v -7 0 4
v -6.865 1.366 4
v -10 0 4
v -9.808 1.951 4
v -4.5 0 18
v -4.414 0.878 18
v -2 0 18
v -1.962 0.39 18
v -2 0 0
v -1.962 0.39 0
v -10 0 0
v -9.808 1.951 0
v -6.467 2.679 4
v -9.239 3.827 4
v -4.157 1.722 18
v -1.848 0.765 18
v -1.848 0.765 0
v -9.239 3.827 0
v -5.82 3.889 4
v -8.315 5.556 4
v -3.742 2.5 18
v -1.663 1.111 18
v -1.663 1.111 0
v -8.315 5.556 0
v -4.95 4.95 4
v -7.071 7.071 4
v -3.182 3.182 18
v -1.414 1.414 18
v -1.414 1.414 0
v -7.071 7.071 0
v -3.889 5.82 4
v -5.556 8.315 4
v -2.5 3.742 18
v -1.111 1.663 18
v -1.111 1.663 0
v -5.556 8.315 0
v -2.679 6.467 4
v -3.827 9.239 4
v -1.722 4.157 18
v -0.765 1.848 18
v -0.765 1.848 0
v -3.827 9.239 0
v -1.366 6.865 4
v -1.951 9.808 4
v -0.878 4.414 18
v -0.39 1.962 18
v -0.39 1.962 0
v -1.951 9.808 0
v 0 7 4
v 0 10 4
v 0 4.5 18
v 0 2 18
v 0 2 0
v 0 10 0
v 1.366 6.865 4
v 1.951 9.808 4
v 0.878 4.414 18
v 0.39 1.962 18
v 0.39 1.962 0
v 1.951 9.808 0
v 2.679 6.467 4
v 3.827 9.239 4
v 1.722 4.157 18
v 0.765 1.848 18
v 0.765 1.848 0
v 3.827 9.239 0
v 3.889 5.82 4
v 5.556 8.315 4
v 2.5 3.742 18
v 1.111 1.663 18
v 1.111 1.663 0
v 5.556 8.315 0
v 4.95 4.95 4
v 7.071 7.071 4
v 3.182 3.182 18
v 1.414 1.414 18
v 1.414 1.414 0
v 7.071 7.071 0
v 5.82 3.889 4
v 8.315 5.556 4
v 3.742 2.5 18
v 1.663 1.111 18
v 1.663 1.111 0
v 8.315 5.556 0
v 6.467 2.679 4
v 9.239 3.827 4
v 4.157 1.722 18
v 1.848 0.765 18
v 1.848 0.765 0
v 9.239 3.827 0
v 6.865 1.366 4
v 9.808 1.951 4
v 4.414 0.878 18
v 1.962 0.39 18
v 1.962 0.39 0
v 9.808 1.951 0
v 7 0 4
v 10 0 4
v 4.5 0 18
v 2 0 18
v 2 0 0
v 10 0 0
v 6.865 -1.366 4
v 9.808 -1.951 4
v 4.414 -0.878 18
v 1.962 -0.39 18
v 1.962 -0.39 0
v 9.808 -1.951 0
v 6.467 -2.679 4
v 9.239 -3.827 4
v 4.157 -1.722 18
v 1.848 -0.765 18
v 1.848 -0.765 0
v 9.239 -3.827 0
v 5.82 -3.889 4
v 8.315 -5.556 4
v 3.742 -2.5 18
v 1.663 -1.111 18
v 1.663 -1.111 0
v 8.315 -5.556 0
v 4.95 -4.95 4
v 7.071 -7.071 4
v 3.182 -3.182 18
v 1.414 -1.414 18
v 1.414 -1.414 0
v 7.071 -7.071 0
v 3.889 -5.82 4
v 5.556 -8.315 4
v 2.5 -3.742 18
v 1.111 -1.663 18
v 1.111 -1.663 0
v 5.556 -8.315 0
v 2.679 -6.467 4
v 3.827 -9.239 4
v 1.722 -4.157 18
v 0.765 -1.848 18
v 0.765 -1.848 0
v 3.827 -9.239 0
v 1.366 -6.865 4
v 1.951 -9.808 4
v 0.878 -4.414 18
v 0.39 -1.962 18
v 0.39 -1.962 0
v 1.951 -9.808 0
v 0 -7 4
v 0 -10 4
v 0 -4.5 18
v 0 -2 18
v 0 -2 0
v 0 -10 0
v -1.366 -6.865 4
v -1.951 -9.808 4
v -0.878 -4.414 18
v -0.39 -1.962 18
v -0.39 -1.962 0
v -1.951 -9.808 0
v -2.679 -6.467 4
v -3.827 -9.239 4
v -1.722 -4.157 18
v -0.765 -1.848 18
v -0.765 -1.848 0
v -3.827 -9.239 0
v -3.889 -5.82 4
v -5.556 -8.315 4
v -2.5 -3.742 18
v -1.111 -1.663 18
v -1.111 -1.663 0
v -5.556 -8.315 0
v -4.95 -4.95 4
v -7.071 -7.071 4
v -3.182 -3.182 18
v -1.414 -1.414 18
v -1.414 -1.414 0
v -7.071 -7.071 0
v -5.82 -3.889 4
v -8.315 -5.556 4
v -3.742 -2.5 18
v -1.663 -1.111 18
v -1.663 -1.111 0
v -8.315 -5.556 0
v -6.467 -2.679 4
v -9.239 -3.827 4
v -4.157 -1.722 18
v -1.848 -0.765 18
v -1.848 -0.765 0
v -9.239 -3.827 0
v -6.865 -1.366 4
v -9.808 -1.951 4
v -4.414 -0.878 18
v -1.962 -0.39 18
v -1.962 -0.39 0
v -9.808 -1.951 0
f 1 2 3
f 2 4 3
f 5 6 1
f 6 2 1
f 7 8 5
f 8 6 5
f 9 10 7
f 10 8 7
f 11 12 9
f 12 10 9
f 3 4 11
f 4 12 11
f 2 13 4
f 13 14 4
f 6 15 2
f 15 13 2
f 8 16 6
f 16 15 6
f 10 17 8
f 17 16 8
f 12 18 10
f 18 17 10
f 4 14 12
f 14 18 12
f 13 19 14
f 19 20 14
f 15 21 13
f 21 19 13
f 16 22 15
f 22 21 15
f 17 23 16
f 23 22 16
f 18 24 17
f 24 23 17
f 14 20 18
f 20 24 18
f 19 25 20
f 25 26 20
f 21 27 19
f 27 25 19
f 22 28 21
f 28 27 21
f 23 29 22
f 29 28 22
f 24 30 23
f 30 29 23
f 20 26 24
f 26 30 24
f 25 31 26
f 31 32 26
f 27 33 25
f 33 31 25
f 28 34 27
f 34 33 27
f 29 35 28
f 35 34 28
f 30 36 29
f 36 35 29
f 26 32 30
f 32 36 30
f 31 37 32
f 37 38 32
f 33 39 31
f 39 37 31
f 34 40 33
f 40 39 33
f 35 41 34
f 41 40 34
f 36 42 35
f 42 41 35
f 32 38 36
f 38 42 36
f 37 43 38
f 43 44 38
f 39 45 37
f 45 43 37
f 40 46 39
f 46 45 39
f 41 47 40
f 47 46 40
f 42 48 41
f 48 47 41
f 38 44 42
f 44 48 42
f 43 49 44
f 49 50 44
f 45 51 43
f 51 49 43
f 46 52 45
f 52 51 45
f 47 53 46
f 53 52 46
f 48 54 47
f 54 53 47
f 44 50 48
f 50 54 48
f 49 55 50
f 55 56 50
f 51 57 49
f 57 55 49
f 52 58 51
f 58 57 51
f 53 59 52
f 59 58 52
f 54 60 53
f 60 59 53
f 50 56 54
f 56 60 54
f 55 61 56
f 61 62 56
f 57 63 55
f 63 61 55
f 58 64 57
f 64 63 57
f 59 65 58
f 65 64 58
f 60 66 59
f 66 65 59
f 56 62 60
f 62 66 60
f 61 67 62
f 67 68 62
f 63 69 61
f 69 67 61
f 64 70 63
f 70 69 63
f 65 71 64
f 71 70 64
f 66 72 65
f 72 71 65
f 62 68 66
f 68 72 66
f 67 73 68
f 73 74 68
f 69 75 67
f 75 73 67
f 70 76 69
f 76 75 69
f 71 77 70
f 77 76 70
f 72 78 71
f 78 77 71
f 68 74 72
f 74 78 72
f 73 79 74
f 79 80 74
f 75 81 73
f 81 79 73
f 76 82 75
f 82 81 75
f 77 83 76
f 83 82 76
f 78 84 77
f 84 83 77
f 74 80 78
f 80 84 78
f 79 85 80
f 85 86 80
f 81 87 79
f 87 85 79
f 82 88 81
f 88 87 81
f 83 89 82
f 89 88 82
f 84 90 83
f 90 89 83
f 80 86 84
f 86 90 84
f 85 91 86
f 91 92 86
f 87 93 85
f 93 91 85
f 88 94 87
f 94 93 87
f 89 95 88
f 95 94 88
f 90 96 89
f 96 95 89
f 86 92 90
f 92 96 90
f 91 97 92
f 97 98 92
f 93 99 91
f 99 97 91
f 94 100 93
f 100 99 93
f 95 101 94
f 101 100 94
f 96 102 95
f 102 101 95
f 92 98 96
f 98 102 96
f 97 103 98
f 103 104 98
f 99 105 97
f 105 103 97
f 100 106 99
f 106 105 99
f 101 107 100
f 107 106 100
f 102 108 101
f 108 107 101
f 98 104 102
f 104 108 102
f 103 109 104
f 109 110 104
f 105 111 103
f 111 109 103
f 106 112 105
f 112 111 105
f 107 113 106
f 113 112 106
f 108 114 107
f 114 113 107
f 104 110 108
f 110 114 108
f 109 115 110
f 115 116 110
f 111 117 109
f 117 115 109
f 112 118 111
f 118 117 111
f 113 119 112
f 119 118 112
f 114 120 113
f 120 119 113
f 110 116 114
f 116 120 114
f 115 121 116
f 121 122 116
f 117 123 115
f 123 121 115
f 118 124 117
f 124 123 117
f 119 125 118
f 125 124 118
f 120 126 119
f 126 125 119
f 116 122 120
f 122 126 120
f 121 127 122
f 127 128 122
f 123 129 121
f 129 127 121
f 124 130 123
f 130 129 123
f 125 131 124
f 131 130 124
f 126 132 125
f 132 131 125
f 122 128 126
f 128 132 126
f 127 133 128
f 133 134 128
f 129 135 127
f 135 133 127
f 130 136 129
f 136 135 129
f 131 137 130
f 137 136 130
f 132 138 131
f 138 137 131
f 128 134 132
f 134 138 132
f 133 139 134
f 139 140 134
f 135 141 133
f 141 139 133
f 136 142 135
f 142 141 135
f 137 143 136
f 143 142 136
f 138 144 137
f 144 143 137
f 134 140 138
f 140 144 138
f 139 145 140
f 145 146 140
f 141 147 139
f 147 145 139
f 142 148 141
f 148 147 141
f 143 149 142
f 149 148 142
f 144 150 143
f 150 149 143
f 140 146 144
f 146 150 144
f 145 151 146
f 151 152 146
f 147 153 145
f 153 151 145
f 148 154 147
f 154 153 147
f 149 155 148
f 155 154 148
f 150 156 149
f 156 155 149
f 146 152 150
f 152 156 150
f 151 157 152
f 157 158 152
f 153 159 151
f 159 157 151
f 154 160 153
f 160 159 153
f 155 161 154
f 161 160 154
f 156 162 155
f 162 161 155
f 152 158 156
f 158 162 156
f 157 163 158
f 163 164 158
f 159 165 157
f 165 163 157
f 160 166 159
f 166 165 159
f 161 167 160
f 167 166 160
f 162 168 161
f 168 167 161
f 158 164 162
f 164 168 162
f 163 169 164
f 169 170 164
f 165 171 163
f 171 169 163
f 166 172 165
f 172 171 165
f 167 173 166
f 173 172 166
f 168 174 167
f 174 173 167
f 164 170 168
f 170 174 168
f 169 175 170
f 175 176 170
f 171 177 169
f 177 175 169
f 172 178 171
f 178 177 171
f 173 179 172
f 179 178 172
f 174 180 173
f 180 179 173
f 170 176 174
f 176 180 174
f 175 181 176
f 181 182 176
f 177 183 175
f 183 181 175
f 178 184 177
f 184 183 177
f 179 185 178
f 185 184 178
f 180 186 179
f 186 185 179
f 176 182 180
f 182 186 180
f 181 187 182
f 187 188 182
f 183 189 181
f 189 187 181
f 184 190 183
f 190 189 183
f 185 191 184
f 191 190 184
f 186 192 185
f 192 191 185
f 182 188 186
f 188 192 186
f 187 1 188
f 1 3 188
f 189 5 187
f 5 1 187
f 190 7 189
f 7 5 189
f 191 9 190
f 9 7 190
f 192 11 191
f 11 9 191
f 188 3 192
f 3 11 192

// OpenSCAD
$fn = 32;

// ----------------------------------------------------------------------
// Profiled standoff: conical spacer, 18 mm long, bore 4 mm
// ----------------------------------------------------------------------

// --- parameters (mm) ---
revolve_angle = 360;      // full turn around the Z axis
profile_points = 6;       // points of the closed outline

profile = [[2, 0], [10, 0], [10, 4], [7, 4], [4.5, 18], [2, 18]];  // single closed polygon, 6 points, counter clockwise

// --- the one profile operation ---
rotate_extrude(angle = revolve_angle) polygon(points = profile);
